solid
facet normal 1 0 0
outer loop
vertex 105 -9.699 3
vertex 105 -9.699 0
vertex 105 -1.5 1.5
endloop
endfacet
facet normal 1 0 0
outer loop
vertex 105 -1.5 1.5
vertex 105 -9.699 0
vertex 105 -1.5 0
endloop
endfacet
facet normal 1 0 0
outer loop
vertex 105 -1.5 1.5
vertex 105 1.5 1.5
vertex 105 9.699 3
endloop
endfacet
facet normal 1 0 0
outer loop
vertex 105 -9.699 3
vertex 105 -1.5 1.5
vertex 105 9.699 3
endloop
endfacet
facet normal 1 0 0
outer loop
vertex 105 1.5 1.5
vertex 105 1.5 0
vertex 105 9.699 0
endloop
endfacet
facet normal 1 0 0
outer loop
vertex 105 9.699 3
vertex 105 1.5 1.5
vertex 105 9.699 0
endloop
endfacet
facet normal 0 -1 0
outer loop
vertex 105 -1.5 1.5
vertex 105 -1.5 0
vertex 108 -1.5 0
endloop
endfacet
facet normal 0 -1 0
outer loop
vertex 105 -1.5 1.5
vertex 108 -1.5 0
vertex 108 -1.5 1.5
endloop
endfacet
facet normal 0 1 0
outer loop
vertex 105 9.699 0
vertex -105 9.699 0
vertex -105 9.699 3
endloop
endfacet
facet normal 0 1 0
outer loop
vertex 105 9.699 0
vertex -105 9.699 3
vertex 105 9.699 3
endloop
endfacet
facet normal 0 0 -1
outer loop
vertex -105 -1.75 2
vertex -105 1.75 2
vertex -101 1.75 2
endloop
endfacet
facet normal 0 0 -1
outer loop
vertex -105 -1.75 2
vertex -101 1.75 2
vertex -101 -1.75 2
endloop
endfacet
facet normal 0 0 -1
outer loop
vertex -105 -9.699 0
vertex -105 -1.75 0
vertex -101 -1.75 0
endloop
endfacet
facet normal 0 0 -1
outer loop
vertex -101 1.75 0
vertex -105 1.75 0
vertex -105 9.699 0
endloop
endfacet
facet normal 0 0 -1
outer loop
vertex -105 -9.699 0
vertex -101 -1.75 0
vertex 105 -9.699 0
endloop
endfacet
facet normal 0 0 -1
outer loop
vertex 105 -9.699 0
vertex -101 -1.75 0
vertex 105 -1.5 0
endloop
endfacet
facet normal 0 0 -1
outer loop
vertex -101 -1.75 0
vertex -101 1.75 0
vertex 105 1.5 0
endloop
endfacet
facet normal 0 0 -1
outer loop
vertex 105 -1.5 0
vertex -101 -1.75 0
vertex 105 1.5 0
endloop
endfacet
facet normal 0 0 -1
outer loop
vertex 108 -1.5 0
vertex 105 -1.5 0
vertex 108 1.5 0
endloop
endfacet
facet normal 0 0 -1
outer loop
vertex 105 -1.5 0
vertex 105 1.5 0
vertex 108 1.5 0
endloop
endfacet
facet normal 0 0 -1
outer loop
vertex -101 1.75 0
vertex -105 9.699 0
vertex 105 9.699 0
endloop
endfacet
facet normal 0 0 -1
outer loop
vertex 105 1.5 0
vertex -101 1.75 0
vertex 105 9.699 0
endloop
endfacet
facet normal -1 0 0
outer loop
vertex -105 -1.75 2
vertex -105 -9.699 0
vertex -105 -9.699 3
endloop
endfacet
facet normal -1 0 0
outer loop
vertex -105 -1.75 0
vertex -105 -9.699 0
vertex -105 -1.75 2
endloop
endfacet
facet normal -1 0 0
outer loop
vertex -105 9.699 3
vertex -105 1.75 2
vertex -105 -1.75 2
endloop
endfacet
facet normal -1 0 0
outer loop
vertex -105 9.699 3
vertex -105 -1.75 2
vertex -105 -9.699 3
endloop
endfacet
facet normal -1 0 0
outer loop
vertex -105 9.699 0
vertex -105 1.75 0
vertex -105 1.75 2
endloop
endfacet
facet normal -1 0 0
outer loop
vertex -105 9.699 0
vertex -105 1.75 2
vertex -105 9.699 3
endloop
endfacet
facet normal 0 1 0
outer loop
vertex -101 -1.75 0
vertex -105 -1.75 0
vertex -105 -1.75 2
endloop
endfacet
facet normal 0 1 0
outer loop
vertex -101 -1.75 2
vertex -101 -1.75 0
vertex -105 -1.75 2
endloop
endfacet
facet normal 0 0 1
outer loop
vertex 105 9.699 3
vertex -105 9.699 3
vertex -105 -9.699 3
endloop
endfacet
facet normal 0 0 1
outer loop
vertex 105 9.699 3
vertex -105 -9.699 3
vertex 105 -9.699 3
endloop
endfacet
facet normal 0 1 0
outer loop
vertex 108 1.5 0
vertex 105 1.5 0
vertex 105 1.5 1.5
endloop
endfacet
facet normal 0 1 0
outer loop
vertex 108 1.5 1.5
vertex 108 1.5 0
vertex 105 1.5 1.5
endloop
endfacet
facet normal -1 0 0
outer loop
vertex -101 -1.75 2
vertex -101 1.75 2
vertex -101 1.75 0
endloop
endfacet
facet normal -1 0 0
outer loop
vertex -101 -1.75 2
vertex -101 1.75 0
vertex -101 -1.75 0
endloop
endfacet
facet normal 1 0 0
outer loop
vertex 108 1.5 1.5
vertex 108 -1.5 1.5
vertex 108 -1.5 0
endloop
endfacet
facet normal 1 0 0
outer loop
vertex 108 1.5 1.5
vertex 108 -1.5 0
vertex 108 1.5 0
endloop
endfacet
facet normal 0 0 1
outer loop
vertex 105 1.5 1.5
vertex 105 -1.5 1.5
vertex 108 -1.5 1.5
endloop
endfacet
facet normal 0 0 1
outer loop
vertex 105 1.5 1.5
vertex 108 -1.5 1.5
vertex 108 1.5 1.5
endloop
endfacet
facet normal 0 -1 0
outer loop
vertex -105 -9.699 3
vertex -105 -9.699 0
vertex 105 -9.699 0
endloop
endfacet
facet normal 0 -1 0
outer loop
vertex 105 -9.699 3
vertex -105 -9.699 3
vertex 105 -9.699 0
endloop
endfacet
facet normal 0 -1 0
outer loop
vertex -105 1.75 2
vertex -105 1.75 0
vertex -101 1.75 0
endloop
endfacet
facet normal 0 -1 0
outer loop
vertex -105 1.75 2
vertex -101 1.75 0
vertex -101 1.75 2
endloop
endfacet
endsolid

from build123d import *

# Parameters (mm, degrees)
F0_W     = 210
F0_H     = 19.39892
F1_DEPTH = 3
F2_W     = 3
F2_H     = 1.5
F3_DEPTH = 3
F4_W     = 3.5
F4_H     = 2
F5_DEPTH = 4


with BuildPart() as f1:
    # F0 (on Top) → F1 (new body)
    with BuildSketch(Plane.XY):
        Rectangle(F0_W, F0_H)
    extrude(amount=F1_DEPTH)

    # F2 (on face) → F3 (join)
    with BuildSketch(Plane.YZ.offset(105)):
        with Locations((0, 0.75)):
            Rectangle(F2_W, F2_H)
    extrude(amount=F3_DEPTH)

    # F4 (on face) → F5 (cut)
    with BuildSketch(Plane(origin=(-105, 0, 0), x_dir=(0, -1, 0), z_dir=(-1, 0, 0))):
        with Locations((0, 1)):
            Rectangle(F4_W, F4_H)
    extrude(amount=-F5_DEPTH, mode=Mode.SUBTRACT)


solid = f1.part
